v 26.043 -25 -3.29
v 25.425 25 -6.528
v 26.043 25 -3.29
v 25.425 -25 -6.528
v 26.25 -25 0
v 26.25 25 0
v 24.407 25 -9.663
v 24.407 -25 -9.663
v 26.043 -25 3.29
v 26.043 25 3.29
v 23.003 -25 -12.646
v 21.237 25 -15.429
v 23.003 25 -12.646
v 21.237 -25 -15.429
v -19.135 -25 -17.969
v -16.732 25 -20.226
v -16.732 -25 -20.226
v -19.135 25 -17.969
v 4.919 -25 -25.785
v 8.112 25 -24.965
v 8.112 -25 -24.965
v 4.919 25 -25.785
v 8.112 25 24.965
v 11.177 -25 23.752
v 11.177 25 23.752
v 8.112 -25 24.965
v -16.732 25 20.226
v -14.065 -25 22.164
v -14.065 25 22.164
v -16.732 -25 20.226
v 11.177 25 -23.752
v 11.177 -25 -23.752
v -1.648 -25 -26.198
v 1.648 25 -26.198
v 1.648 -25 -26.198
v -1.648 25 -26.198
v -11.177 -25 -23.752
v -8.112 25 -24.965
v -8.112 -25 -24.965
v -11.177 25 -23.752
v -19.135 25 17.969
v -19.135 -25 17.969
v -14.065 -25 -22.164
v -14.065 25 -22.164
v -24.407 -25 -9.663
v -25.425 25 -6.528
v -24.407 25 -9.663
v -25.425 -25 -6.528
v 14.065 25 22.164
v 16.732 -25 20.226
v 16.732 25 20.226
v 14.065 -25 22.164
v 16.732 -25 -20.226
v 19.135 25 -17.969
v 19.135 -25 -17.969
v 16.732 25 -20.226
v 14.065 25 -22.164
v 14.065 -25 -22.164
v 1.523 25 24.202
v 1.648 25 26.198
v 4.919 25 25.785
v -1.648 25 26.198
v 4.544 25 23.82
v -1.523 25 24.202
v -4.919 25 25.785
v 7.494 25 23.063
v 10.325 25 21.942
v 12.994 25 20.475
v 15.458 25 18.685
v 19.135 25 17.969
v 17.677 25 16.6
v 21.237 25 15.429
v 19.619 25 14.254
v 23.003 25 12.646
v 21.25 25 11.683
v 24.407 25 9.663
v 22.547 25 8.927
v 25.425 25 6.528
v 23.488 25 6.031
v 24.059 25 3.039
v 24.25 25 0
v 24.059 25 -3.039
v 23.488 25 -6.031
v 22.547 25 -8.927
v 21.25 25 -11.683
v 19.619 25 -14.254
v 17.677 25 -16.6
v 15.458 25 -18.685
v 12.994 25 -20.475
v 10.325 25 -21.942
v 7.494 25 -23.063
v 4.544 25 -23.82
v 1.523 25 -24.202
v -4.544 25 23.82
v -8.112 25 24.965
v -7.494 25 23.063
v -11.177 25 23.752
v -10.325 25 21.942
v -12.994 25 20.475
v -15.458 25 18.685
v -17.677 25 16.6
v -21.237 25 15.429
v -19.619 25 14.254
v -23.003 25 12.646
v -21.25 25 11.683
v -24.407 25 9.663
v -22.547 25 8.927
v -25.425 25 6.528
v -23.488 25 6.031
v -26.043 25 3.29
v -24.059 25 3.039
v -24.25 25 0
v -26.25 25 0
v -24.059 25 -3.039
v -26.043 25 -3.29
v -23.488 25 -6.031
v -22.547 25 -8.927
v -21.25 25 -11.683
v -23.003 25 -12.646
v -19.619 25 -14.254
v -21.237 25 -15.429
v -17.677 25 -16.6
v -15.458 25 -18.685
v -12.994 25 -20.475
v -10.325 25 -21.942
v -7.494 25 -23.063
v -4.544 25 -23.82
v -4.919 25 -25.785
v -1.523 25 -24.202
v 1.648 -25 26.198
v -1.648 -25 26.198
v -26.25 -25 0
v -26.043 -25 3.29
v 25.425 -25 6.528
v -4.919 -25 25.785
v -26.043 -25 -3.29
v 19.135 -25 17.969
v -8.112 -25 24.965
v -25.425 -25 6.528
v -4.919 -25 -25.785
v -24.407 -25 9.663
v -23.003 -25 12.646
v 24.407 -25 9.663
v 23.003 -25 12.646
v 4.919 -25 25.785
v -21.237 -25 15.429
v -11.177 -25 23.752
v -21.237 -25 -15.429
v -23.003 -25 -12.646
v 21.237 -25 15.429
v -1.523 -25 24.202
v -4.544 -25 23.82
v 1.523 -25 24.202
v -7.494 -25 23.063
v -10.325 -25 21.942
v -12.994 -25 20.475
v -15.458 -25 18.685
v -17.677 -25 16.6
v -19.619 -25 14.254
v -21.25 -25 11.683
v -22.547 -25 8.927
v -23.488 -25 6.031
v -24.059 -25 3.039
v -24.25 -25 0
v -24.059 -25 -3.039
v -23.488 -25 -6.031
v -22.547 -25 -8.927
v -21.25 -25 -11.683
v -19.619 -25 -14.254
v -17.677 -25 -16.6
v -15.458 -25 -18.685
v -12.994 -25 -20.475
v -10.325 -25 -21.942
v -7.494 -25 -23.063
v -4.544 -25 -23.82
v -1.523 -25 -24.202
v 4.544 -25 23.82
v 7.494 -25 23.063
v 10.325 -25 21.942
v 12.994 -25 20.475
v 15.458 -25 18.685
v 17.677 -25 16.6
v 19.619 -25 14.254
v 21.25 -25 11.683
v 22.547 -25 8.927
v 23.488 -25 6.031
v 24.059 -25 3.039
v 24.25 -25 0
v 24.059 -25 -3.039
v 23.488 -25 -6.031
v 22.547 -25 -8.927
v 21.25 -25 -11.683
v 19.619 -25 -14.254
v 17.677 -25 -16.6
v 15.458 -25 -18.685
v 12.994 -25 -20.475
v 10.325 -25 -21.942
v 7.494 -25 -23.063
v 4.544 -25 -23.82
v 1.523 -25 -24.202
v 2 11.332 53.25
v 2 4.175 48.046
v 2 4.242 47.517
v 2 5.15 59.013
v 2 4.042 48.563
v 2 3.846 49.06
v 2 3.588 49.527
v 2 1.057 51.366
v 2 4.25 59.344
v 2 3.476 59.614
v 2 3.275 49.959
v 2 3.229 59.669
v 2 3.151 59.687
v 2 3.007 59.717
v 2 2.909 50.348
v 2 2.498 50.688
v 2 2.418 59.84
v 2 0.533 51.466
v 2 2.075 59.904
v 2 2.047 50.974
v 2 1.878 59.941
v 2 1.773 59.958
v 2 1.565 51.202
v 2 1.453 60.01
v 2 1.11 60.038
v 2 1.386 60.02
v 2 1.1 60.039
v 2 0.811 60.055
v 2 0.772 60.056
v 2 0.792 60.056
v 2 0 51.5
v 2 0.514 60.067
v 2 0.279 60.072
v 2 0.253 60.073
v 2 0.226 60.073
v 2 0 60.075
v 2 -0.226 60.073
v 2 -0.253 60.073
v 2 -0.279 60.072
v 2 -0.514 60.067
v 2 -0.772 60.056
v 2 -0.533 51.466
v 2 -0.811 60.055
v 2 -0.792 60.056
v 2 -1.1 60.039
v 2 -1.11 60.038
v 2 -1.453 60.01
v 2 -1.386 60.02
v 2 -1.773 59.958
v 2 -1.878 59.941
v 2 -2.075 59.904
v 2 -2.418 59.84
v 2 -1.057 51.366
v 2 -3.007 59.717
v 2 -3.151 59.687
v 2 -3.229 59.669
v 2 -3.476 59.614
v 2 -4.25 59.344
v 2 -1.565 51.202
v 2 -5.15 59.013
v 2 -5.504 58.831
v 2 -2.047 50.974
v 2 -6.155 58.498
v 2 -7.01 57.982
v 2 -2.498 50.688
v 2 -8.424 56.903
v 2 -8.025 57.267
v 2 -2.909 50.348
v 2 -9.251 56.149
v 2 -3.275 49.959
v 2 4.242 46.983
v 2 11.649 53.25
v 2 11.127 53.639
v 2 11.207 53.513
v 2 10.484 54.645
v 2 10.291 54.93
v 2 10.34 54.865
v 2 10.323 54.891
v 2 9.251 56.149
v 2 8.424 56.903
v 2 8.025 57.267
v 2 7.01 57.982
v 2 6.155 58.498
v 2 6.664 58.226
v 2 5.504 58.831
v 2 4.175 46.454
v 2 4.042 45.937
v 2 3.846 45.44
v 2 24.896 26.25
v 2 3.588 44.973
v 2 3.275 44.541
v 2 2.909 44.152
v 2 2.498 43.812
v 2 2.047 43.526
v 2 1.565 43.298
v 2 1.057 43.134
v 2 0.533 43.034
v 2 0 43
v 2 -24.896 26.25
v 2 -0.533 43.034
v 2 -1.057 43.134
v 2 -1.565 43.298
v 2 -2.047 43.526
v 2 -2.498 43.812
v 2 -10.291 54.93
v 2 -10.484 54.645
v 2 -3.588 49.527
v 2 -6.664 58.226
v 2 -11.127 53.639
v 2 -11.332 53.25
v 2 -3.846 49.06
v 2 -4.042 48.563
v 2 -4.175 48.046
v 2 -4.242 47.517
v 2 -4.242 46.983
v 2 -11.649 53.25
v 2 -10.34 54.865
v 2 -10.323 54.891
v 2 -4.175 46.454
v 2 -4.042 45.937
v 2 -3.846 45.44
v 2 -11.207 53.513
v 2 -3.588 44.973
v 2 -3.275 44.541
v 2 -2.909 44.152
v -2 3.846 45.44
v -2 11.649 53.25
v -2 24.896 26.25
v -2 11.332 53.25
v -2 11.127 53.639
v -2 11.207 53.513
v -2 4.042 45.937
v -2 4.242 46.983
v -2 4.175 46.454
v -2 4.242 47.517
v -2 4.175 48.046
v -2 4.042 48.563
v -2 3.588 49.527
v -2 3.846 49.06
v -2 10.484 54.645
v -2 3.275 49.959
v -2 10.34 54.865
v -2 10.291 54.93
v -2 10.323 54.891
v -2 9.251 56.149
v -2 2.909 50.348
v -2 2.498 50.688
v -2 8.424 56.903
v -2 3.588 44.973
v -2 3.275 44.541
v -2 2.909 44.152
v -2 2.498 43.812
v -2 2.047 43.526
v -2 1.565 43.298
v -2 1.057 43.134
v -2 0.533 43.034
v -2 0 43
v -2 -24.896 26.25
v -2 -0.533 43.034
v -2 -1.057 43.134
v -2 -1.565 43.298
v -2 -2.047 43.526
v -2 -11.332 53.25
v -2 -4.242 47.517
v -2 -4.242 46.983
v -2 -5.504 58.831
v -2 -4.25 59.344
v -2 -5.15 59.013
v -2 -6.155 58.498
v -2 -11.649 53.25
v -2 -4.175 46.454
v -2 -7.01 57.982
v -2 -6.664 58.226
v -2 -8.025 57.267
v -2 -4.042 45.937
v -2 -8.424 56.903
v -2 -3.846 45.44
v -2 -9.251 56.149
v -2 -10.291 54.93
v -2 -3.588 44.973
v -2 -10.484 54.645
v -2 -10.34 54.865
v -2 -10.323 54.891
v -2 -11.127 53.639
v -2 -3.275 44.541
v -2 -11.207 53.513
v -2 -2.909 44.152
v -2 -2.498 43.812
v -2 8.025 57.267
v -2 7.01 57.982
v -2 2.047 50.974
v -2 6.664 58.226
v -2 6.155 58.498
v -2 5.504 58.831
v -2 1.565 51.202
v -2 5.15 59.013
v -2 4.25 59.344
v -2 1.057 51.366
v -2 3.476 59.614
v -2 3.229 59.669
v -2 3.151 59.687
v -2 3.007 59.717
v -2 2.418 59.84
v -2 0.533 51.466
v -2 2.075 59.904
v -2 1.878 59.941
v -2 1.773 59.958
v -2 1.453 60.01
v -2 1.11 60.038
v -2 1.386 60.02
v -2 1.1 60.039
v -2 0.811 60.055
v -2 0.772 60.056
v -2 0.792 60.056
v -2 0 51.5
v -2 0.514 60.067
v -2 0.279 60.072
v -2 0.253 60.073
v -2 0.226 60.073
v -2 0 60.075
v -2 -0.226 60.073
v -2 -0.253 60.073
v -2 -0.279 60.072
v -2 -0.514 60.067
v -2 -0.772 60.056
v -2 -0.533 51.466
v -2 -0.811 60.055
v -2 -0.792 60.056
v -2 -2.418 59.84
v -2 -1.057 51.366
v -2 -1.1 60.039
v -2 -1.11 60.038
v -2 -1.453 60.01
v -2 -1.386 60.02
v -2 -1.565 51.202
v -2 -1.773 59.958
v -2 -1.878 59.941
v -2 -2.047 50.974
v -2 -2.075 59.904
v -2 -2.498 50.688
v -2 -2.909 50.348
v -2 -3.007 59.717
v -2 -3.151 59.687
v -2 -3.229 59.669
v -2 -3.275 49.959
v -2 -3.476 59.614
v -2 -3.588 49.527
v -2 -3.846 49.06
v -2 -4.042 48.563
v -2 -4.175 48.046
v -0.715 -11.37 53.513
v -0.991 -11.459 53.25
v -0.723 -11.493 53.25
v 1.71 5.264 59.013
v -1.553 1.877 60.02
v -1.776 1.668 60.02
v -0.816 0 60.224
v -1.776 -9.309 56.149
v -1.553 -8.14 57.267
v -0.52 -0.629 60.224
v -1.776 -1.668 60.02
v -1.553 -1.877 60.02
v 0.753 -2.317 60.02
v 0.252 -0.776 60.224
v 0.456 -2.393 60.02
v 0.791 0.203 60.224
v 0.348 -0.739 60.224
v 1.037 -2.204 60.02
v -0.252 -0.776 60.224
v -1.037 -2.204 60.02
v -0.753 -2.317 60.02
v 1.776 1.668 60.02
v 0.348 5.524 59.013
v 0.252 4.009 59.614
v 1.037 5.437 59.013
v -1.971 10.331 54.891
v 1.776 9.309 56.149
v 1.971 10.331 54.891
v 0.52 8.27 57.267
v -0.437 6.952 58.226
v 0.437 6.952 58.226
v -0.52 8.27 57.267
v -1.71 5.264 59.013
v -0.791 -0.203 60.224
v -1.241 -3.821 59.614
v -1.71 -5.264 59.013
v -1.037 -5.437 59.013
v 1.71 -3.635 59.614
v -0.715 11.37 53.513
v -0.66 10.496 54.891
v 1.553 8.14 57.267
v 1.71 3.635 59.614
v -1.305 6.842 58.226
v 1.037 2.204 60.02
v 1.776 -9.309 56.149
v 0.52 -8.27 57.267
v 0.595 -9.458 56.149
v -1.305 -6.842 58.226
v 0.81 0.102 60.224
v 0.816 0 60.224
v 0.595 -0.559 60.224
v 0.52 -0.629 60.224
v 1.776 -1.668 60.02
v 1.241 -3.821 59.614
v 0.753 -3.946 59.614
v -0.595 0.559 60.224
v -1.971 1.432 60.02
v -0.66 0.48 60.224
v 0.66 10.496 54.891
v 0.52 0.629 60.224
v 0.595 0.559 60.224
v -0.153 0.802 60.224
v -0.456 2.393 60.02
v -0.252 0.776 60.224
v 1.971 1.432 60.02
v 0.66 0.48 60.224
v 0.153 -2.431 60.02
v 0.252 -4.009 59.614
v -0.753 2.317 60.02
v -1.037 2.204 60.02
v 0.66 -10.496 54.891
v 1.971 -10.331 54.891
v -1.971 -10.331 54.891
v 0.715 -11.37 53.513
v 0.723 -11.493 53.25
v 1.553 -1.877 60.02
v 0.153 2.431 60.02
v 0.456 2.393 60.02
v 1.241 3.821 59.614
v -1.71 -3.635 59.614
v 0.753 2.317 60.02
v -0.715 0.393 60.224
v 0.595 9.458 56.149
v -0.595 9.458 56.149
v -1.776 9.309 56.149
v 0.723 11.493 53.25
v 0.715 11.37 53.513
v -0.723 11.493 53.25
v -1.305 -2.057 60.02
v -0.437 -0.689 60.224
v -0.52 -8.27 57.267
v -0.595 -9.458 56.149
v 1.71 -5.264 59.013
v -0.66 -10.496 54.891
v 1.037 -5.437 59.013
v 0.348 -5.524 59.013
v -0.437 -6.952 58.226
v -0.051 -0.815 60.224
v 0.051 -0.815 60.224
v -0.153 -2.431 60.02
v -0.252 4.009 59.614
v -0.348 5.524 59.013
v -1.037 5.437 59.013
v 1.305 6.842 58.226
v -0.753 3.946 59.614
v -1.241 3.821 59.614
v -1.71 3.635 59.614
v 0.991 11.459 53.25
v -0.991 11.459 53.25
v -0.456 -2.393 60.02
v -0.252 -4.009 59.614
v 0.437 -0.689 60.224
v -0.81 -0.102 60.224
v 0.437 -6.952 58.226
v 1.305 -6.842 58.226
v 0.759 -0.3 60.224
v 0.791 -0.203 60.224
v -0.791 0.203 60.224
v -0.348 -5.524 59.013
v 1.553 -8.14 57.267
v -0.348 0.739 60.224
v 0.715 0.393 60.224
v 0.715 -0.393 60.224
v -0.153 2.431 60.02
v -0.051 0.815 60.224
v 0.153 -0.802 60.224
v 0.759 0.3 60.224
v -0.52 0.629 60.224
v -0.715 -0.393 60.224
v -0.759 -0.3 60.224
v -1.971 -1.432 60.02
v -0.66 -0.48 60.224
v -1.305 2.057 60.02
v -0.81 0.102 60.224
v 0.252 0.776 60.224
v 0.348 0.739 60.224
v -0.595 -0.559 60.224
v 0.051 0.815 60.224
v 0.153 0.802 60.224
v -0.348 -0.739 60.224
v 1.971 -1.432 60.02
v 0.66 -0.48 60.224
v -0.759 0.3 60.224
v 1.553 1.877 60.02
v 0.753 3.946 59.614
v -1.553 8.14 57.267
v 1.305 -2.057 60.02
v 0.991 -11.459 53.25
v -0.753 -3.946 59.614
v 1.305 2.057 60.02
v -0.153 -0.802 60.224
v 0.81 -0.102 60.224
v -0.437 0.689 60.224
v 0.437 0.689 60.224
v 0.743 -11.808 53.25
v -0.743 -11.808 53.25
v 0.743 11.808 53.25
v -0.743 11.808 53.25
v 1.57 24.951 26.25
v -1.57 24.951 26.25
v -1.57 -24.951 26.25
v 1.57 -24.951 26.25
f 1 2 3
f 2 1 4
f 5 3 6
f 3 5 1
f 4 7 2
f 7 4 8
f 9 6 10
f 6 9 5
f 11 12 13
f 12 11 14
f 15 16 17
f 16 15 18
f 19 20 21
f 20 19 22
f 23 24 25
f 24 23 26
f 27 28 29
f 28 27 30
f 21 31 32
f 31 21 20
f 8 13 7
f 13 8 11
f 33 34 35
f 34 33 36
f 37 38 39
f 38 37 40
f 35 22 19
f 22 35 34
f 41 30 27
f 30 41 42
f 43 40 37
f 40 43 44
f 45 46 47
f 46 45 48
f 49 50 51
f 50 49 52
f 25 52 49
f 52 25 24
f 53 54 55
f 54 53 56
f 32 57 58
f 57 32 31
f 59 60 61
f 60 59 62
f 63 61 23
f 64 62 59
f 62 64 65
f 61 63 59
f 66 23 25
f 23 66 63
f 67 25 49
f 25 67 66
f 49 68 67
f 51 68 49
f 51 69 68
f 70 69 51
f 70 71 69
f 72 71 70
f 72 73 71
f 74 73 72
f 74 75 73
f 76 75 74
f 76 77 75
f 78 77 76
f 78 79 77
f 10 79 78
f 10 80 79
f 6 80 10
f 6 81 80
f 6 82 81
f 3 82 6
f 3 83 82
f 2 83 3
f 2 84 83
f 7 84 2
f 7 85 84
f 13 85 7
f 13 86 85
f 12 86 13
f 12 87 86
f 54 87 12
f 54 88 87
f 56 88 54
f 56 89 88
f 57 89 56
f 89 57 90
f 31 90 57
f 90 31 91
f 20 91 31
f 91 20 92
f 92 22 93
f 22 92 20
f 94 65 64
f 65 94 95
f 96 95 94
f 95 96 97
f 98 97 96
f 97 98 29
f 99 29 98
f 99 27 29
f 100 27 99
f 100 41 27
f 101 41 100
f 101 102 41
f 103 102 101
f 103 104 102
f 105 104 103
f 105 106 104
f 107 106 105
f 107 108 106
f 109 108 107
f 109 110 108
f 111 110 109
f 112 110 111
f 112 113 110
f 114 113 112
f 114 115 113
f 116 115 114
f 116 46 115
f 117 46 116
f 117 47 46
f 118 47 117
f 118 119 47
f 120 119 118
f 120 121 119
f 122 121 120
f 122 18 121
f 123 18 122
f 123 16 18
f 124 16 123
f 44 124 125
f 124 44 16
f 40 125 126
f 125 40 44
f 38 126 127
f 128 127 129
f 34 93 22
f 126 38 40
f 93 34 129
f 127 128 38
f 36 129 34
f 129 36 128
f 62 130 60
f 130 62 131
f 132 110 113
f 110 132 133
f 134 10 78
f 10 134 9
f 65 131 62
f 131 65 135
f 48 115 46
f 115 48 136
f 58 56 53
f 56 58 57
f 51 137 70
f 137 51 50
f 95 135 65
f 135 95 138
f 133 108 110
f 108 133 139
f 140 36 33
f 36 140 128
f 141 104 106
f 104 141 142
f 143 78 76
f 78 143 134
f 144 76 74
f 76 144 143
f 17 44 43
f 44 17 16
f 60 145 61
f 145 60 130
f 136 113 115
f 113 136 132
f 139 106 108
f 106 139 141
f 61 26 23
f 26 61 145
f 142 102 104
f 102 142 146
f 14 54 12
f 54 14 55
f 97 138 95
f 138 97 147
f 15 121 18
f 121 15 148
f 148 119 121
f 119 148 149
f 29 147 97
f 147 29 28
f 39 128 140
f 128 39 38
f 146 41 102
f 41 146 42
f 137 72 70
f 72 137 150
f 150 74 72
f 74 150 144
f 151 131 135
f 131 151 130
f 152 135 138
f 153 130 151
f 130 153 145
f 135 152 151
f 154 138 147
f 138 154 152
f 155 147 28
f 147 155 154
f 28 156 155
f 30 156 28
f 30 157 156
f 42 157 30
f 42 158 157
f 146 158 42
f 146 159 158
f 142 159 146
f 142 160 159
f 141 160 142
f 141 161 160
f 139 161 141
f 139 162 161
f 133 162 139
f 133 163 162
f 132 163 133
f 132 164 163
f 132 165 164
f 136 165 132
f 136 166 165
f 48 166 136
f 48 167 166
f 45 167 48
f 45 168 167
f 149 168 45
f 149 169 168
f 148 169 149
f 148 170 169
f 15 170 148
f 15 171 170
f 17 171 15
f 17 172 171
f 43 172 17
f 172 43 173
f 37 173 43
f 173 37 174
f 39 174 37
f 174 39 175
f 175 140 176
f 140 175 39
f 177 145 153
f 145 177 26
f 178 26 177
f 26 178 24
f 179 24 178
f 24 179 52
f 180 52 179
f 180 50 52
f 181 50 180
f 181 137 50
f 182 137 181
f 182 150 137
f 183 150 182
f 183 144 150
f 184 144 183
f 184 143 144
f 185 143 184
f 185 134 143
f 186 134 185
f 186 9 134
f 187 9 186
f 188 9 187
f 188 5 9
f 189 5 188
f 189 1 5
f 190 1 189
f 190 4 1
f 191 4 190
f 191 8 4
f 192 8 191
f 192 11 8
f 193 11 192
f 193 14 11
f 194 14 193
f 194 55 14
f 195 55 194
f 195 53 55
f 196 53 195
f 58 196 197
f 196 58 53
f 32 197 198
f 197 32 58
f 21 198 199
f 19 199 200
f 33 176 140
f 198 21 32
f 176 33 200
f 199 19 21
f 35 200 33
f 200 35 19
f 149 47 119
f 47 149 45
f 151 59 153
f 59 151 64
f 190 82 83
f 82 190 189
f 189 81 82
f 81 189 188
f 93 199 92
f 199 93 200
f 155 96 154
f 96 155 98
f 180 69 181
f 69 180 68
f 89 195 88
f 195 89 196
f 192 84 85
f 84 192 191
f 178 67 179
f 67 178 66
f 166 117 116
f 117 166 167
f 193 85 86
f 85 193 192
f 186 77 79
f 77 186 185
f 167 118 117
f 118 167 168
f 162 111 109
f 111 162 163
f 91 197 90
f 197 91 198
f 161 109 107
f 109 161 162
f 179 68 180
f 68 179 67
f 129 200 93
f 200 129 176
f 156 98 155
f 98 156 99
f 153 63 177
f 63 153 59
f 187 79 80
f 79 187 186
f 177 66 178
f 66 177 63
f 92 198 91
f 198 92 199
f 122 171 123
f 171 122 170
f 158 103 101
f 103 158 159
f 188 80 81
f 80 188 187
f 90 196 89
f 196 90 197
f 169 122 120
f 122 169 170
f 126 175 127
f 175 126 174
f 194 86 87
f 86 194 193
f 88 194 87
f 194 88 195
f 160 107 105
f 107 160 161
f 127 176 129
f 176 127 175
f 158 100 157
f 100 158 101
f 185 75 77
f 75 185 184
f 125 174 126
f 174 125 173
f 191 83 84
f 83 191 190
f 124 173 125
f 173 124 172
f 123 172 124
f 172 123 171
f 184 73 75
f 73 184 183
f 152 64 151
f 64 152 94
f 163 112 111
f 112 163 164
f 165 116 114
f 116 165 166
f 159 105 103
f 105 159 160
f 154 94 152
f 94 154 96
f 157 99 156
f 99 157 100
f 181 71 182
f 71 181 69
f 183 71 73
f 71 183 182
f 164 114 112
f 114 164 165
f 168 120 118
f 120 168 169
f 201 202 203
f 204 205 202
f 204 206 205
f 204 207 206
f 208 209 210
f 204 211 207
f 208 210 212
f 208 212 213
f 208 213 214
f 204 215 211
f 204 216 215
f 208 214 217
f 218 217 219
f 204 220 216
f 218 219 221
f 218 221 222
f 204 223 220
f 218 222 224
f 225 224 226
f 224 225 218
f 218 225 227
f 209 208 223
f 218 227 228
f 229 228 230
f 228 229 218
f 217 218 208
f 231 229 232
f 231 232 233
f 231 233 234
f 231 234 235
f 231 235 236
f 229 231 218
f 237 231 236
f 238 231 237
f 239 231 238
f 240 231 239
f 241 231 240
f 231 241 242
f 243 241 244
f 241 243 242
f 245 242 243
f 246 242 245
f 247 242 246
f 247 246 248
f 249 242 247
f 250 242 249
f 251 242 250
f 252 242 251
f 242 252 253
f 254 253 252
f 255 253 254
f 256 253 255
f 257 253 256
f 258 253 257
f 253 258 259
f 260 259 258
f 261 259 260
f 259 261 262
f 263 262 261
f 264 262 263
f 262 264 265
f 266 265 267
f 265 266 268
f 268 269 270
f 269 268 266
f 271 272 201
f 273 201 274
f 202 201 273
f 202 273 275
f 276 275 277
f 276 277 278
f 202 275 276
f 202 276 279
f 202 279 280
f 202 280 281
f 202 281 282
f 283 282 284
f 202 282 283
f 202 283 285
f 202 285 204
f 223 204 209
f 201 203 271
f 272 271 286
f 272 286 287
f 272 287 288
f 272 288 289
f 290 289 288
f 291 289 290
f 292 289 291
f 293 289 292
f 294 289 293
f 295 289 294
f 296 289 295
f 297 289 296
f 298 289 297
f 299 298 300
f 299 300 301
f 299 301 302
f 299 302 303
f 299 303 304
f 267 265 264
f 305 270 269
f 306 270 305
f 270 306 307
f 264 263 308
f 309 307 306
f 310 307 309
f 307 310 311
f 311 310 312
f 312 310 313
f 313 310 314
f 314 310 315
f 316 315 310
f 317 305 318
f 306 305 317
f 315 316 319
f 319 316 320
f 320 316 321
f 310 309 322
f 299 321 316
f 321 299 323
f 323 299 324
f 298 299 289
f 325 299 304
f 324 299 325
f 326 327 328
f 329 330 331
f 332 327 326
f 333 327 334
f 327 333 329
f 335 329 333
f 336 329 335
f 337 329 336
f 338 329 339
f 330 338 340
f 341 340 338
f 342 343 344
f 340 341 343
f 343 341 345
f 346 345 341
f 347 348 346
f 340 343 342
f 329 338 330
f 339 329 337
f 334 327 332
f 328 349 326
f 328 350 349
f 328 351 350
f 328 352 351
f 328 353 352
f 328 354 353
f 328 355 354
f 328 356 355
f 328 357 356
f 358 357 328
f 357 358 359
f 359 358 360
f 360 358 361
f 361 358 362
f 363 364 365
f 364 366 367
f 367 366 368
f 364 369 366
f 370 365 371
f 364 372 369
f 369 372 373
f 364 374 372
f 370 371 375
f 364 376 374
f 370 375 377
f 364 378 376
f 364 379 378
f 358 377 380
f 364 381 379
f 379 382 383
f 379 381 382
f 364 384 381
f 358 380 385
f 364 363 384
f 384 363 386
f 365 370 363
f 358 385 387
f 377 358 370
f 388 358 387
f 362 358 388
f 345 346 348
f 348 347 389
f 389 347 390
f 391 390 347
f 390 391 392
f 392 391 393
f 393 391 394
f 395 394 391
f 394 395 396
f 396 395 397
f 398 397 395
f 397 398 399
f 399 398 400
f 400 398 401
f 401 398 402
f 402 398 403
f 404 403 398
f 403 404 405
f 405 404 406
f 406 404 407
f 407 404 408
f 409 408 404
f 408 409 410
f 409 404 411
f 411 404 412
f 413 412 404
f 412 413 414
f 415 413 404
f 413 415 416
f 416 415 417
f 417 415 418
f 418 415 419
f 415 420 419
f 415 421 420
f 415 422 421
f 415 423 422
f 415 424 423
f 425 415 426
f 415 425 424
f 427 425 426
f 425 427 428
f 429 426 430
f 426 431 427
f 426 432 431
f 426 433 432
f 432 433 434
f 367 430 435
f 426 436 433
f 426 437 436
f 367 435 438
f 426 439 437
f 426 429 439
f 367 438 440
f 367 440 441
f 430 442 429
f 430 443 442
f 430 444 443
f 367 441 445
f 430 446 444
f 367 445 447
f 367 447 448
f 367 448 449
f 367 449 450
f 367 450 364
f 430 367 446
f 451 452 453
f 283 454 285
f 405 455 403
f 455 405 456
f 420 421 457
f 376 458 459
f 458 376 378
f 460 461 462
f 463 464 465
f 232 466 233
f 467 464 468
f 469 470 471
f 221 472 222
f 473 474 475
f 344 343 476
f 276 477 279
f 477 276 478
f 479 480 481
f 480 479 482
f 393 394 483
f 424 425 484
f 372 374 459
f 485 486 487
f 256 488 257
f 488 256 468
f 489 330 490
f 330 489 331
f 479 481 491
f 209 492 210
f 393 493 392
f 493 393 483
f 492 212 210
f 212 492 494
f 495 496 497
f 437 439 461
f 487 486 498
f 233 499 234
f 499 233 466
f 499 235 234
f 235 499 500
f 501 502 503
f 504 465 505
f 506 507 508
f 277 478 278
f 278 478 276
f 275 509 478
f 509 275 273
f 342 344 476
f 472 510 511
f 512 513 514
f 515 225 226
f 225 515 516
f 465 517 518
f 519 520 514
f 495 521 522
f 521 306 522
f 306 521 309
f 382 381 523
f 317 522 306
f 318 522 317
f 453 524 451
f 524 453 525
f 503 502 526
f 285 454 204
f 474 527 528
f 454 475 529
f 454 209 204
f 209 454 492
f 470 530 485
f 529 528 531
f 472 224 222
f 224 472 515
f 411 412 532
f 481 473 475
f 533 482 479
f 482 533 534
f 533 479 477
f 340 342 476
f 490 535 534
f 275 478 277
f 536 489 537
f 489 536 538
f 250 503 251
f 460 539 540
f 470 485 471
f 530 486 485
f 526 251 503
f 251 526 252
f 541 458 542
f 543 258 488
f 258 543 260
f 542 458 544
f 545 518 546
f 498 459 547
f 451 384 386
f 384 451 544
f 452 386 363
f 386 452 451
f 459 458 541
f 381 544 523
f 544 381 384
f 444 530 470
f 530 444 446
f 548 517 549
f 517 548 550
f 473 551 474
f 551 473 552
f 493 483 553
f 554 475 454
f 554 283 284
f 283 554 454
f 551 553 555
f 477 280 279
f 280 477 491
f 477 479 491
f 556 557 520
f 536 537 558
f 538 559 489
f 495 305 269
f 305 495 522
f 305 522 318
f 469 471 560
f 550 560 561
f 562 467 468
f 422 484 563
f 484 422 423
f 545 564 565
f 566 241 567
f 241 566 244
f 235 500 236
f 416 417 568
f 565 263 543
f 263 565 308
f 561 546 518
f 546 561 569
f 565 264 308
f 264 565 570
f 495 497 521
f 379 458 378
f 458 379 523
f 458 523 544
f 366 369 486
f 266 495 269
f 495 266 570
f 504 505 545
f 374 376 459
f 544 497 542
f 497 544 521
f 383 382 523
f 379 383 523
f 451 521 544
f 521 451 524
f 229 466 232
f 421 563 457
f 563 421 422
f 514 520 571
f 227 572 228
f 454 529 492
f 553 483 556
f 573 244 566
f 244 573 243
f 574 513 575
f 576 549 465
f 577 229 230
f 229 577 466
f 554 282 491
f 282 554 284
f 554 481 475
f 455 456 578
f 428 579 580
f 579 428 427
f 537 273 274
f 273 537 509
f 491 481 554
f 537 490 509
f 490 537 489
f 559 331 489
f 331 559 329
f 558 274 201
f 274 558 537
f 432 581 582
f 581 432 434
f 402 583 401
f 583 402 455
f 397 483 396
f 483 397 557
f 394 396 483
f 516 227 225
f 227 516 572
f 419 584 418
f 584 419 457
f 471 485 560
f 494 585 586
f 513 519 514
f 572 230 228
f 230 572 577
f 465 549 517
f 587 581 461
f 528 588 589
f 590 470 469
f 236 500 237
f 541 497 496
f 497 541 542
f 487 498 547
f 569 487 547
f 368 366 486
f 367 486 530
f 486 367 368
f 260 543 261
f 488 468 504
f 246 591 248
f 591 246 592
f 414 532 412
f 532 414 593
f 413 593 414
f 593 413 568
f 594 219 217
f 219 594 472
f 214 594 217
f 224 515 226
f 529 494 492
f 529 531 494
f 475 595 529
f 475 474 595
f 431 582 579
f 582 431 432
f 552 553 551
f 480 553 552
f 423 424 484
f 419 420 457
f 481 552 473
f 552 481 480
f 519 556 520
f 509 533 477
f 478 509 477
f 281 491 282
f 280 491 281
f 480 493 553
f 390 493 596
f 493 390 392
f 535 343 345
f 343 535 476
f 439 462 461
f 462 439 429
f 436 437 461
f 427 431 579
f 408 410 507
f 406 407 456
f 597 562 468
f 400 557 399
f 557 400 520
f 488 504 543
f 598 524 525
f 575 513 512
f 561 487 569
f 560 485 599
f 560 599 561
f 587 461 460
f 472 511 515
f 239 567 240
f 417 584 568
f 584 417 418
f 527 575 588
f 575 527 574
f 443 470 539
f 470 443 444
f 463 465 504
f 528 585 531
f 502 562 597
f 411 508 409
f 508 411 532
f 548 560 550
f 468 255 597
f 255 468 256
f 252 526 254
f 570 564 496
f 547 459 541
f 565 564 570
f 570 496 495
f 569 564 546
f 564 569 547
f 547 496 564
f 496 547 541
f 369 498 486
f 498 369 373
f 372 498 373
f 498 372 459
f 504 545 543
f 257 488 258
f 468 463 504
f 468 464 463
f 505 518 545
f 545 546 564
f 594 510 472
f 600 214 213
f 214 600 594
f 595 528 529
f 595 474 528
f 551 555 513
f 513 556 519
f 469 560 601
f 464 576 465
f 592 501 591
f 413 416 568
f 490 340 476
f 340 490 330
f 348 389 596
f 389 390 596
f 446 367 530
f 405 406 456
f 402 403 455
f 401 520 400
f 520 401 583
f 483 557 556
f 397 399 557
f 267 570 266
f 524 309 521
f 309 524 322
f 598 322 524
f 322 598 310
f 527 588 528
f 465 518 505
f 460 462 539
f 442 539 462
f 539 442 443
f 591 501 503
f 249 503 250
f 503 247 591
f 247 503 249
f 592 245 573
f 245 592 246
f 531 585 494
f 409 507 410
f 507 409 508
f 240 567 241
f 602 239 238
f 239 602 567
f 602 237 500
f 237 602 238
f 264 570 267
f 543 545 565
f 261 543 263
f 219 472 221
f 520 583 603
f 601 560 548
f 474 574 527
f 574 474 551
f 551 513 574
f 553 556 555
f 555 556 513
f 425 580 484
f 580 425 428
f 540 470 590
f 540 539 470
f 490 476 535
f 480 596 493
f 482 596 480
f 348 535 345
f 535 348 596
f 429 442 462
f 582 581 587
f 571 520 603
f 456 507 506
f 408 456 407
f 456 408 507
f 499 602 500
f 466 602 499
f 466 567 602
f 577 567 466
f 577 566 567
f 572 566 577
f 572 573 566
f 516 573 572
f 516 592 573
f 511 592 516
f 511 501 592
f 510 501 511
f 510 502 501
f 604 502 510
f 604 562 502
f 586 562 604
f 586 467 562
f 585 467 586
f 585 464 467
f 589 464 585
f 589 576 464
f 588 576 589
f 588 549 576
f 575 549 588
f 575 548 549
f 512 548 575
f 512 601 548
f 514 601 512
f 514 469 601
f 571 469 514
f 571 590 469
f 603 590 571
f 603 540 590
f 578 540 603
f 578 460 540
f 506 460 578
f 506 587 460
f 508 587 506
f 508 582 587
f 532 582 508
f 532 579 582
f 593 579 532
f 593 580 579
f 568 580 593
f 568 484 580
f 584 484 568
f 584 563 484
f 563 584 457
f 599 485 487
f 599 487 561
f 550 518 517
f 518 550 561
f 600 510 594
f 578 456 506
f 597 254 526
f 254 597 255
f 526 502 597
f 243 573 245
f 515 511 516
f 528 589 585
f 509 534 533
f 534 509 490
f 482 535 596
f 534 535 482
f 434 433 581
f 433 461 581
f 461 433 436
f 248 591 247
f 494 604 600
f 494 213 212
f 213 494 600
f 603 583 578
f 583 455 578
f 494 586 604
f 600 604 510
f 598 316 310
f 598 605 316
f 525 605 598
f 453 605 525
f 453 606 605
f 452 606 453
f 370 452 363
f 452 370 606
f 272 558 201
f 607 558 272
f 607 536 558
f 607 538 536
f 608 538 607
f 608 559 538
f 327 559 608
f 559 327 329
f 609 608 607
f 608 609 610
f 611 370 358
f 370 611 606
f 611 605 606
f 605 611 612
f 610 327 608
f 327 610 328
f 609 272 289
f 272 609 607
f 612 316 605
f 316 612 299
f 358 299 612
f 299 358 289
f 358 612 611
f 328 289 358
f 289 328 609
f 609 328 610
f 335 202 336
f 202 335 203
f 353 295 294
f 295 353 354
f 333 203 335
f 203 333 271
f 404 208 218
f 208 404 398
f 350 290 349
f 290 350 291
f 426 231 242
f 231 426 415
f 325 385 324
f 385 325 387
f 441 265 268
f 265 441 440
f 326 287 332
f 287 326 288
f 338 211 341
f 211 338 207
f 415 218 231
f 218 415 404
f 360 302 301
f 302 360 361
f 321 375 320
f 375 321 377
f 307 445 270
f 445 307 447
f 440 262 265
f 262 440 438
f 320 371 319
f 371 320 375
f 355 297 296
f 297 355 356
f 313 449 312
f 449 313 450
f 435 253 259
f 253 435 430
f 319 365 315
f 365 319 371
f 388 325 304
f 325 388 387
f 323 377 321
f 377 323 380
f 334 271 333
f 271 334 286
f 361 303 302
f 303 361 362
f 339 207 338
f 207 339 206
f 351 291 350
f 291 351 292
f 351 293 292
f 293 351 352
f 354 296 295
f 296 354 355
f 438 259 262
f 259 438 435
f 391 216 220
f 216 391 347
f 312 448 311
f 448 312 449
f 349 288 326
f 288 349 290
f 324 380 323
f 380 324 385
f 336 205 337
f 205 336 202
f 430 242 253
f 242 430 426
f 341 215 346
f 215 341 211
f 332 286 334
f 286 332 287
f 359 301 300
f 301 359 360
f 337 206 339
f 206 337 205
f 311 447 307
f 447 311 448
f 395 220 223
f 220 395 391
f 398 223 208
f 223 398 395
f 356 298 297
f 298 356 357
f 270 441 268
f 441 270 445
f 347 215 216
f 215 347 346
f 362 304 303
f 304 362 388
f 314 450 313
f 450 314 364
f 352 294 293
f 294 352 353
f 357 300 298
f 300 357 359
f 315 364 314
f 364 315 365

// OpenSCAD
Upor();


    uporWid = 50;
    thicns = 2;
    tubeDia = 48.5;
    shplintHoleDia = 8.5;
    shplintHoleHeig = 21;
    sphereRad = 13;



module Upor() {

    $fn = 50;

    py = - uporWid/2;

    // Охват
    difference() {
        
        rotate([-90,0,0]) 
        cylinder(h=uporWid, d = tubeDia+2*thicns,center=true);
        
        rotate([-90,0,0]) 
        cylinder(h=uporWid+2, d = tubeDia,center=true);           
    }

    difference() 
    {
   
        intersection() 
        {
            union() 
            {
                intersection() 
                {

                    //срез полный    
                    translate([-thicns,py,tubeDia/2+1]) 
                    cube([thicns*2, uporWid, uporWid]);

                    //сфера
                    translate([0,0,tubeDia/2+thicns+shplintHoleHeig])
                    sphere(r=sphereRad);
                }

                //срез внутренний    
                translate([-thicns,py,tubeDia/2+1]) 
                cube([thicns*2, uporWid, uporWid/2+3]);
            }

            //конус
            translate([0,0,tubeDia/2+thicns])
            cylinder(h=uporWid*tan(64)/2,d1=uporWid,d2=0);    
        }



        //цилиндр дырки
        translate([0,0,tubeDia/2+thicns+shplintHoleHeig])
        rotate([0,-90,0])
        cylinder(h=tubeDia,d=shplintHoleDia,center=true);    
        

    }

}
